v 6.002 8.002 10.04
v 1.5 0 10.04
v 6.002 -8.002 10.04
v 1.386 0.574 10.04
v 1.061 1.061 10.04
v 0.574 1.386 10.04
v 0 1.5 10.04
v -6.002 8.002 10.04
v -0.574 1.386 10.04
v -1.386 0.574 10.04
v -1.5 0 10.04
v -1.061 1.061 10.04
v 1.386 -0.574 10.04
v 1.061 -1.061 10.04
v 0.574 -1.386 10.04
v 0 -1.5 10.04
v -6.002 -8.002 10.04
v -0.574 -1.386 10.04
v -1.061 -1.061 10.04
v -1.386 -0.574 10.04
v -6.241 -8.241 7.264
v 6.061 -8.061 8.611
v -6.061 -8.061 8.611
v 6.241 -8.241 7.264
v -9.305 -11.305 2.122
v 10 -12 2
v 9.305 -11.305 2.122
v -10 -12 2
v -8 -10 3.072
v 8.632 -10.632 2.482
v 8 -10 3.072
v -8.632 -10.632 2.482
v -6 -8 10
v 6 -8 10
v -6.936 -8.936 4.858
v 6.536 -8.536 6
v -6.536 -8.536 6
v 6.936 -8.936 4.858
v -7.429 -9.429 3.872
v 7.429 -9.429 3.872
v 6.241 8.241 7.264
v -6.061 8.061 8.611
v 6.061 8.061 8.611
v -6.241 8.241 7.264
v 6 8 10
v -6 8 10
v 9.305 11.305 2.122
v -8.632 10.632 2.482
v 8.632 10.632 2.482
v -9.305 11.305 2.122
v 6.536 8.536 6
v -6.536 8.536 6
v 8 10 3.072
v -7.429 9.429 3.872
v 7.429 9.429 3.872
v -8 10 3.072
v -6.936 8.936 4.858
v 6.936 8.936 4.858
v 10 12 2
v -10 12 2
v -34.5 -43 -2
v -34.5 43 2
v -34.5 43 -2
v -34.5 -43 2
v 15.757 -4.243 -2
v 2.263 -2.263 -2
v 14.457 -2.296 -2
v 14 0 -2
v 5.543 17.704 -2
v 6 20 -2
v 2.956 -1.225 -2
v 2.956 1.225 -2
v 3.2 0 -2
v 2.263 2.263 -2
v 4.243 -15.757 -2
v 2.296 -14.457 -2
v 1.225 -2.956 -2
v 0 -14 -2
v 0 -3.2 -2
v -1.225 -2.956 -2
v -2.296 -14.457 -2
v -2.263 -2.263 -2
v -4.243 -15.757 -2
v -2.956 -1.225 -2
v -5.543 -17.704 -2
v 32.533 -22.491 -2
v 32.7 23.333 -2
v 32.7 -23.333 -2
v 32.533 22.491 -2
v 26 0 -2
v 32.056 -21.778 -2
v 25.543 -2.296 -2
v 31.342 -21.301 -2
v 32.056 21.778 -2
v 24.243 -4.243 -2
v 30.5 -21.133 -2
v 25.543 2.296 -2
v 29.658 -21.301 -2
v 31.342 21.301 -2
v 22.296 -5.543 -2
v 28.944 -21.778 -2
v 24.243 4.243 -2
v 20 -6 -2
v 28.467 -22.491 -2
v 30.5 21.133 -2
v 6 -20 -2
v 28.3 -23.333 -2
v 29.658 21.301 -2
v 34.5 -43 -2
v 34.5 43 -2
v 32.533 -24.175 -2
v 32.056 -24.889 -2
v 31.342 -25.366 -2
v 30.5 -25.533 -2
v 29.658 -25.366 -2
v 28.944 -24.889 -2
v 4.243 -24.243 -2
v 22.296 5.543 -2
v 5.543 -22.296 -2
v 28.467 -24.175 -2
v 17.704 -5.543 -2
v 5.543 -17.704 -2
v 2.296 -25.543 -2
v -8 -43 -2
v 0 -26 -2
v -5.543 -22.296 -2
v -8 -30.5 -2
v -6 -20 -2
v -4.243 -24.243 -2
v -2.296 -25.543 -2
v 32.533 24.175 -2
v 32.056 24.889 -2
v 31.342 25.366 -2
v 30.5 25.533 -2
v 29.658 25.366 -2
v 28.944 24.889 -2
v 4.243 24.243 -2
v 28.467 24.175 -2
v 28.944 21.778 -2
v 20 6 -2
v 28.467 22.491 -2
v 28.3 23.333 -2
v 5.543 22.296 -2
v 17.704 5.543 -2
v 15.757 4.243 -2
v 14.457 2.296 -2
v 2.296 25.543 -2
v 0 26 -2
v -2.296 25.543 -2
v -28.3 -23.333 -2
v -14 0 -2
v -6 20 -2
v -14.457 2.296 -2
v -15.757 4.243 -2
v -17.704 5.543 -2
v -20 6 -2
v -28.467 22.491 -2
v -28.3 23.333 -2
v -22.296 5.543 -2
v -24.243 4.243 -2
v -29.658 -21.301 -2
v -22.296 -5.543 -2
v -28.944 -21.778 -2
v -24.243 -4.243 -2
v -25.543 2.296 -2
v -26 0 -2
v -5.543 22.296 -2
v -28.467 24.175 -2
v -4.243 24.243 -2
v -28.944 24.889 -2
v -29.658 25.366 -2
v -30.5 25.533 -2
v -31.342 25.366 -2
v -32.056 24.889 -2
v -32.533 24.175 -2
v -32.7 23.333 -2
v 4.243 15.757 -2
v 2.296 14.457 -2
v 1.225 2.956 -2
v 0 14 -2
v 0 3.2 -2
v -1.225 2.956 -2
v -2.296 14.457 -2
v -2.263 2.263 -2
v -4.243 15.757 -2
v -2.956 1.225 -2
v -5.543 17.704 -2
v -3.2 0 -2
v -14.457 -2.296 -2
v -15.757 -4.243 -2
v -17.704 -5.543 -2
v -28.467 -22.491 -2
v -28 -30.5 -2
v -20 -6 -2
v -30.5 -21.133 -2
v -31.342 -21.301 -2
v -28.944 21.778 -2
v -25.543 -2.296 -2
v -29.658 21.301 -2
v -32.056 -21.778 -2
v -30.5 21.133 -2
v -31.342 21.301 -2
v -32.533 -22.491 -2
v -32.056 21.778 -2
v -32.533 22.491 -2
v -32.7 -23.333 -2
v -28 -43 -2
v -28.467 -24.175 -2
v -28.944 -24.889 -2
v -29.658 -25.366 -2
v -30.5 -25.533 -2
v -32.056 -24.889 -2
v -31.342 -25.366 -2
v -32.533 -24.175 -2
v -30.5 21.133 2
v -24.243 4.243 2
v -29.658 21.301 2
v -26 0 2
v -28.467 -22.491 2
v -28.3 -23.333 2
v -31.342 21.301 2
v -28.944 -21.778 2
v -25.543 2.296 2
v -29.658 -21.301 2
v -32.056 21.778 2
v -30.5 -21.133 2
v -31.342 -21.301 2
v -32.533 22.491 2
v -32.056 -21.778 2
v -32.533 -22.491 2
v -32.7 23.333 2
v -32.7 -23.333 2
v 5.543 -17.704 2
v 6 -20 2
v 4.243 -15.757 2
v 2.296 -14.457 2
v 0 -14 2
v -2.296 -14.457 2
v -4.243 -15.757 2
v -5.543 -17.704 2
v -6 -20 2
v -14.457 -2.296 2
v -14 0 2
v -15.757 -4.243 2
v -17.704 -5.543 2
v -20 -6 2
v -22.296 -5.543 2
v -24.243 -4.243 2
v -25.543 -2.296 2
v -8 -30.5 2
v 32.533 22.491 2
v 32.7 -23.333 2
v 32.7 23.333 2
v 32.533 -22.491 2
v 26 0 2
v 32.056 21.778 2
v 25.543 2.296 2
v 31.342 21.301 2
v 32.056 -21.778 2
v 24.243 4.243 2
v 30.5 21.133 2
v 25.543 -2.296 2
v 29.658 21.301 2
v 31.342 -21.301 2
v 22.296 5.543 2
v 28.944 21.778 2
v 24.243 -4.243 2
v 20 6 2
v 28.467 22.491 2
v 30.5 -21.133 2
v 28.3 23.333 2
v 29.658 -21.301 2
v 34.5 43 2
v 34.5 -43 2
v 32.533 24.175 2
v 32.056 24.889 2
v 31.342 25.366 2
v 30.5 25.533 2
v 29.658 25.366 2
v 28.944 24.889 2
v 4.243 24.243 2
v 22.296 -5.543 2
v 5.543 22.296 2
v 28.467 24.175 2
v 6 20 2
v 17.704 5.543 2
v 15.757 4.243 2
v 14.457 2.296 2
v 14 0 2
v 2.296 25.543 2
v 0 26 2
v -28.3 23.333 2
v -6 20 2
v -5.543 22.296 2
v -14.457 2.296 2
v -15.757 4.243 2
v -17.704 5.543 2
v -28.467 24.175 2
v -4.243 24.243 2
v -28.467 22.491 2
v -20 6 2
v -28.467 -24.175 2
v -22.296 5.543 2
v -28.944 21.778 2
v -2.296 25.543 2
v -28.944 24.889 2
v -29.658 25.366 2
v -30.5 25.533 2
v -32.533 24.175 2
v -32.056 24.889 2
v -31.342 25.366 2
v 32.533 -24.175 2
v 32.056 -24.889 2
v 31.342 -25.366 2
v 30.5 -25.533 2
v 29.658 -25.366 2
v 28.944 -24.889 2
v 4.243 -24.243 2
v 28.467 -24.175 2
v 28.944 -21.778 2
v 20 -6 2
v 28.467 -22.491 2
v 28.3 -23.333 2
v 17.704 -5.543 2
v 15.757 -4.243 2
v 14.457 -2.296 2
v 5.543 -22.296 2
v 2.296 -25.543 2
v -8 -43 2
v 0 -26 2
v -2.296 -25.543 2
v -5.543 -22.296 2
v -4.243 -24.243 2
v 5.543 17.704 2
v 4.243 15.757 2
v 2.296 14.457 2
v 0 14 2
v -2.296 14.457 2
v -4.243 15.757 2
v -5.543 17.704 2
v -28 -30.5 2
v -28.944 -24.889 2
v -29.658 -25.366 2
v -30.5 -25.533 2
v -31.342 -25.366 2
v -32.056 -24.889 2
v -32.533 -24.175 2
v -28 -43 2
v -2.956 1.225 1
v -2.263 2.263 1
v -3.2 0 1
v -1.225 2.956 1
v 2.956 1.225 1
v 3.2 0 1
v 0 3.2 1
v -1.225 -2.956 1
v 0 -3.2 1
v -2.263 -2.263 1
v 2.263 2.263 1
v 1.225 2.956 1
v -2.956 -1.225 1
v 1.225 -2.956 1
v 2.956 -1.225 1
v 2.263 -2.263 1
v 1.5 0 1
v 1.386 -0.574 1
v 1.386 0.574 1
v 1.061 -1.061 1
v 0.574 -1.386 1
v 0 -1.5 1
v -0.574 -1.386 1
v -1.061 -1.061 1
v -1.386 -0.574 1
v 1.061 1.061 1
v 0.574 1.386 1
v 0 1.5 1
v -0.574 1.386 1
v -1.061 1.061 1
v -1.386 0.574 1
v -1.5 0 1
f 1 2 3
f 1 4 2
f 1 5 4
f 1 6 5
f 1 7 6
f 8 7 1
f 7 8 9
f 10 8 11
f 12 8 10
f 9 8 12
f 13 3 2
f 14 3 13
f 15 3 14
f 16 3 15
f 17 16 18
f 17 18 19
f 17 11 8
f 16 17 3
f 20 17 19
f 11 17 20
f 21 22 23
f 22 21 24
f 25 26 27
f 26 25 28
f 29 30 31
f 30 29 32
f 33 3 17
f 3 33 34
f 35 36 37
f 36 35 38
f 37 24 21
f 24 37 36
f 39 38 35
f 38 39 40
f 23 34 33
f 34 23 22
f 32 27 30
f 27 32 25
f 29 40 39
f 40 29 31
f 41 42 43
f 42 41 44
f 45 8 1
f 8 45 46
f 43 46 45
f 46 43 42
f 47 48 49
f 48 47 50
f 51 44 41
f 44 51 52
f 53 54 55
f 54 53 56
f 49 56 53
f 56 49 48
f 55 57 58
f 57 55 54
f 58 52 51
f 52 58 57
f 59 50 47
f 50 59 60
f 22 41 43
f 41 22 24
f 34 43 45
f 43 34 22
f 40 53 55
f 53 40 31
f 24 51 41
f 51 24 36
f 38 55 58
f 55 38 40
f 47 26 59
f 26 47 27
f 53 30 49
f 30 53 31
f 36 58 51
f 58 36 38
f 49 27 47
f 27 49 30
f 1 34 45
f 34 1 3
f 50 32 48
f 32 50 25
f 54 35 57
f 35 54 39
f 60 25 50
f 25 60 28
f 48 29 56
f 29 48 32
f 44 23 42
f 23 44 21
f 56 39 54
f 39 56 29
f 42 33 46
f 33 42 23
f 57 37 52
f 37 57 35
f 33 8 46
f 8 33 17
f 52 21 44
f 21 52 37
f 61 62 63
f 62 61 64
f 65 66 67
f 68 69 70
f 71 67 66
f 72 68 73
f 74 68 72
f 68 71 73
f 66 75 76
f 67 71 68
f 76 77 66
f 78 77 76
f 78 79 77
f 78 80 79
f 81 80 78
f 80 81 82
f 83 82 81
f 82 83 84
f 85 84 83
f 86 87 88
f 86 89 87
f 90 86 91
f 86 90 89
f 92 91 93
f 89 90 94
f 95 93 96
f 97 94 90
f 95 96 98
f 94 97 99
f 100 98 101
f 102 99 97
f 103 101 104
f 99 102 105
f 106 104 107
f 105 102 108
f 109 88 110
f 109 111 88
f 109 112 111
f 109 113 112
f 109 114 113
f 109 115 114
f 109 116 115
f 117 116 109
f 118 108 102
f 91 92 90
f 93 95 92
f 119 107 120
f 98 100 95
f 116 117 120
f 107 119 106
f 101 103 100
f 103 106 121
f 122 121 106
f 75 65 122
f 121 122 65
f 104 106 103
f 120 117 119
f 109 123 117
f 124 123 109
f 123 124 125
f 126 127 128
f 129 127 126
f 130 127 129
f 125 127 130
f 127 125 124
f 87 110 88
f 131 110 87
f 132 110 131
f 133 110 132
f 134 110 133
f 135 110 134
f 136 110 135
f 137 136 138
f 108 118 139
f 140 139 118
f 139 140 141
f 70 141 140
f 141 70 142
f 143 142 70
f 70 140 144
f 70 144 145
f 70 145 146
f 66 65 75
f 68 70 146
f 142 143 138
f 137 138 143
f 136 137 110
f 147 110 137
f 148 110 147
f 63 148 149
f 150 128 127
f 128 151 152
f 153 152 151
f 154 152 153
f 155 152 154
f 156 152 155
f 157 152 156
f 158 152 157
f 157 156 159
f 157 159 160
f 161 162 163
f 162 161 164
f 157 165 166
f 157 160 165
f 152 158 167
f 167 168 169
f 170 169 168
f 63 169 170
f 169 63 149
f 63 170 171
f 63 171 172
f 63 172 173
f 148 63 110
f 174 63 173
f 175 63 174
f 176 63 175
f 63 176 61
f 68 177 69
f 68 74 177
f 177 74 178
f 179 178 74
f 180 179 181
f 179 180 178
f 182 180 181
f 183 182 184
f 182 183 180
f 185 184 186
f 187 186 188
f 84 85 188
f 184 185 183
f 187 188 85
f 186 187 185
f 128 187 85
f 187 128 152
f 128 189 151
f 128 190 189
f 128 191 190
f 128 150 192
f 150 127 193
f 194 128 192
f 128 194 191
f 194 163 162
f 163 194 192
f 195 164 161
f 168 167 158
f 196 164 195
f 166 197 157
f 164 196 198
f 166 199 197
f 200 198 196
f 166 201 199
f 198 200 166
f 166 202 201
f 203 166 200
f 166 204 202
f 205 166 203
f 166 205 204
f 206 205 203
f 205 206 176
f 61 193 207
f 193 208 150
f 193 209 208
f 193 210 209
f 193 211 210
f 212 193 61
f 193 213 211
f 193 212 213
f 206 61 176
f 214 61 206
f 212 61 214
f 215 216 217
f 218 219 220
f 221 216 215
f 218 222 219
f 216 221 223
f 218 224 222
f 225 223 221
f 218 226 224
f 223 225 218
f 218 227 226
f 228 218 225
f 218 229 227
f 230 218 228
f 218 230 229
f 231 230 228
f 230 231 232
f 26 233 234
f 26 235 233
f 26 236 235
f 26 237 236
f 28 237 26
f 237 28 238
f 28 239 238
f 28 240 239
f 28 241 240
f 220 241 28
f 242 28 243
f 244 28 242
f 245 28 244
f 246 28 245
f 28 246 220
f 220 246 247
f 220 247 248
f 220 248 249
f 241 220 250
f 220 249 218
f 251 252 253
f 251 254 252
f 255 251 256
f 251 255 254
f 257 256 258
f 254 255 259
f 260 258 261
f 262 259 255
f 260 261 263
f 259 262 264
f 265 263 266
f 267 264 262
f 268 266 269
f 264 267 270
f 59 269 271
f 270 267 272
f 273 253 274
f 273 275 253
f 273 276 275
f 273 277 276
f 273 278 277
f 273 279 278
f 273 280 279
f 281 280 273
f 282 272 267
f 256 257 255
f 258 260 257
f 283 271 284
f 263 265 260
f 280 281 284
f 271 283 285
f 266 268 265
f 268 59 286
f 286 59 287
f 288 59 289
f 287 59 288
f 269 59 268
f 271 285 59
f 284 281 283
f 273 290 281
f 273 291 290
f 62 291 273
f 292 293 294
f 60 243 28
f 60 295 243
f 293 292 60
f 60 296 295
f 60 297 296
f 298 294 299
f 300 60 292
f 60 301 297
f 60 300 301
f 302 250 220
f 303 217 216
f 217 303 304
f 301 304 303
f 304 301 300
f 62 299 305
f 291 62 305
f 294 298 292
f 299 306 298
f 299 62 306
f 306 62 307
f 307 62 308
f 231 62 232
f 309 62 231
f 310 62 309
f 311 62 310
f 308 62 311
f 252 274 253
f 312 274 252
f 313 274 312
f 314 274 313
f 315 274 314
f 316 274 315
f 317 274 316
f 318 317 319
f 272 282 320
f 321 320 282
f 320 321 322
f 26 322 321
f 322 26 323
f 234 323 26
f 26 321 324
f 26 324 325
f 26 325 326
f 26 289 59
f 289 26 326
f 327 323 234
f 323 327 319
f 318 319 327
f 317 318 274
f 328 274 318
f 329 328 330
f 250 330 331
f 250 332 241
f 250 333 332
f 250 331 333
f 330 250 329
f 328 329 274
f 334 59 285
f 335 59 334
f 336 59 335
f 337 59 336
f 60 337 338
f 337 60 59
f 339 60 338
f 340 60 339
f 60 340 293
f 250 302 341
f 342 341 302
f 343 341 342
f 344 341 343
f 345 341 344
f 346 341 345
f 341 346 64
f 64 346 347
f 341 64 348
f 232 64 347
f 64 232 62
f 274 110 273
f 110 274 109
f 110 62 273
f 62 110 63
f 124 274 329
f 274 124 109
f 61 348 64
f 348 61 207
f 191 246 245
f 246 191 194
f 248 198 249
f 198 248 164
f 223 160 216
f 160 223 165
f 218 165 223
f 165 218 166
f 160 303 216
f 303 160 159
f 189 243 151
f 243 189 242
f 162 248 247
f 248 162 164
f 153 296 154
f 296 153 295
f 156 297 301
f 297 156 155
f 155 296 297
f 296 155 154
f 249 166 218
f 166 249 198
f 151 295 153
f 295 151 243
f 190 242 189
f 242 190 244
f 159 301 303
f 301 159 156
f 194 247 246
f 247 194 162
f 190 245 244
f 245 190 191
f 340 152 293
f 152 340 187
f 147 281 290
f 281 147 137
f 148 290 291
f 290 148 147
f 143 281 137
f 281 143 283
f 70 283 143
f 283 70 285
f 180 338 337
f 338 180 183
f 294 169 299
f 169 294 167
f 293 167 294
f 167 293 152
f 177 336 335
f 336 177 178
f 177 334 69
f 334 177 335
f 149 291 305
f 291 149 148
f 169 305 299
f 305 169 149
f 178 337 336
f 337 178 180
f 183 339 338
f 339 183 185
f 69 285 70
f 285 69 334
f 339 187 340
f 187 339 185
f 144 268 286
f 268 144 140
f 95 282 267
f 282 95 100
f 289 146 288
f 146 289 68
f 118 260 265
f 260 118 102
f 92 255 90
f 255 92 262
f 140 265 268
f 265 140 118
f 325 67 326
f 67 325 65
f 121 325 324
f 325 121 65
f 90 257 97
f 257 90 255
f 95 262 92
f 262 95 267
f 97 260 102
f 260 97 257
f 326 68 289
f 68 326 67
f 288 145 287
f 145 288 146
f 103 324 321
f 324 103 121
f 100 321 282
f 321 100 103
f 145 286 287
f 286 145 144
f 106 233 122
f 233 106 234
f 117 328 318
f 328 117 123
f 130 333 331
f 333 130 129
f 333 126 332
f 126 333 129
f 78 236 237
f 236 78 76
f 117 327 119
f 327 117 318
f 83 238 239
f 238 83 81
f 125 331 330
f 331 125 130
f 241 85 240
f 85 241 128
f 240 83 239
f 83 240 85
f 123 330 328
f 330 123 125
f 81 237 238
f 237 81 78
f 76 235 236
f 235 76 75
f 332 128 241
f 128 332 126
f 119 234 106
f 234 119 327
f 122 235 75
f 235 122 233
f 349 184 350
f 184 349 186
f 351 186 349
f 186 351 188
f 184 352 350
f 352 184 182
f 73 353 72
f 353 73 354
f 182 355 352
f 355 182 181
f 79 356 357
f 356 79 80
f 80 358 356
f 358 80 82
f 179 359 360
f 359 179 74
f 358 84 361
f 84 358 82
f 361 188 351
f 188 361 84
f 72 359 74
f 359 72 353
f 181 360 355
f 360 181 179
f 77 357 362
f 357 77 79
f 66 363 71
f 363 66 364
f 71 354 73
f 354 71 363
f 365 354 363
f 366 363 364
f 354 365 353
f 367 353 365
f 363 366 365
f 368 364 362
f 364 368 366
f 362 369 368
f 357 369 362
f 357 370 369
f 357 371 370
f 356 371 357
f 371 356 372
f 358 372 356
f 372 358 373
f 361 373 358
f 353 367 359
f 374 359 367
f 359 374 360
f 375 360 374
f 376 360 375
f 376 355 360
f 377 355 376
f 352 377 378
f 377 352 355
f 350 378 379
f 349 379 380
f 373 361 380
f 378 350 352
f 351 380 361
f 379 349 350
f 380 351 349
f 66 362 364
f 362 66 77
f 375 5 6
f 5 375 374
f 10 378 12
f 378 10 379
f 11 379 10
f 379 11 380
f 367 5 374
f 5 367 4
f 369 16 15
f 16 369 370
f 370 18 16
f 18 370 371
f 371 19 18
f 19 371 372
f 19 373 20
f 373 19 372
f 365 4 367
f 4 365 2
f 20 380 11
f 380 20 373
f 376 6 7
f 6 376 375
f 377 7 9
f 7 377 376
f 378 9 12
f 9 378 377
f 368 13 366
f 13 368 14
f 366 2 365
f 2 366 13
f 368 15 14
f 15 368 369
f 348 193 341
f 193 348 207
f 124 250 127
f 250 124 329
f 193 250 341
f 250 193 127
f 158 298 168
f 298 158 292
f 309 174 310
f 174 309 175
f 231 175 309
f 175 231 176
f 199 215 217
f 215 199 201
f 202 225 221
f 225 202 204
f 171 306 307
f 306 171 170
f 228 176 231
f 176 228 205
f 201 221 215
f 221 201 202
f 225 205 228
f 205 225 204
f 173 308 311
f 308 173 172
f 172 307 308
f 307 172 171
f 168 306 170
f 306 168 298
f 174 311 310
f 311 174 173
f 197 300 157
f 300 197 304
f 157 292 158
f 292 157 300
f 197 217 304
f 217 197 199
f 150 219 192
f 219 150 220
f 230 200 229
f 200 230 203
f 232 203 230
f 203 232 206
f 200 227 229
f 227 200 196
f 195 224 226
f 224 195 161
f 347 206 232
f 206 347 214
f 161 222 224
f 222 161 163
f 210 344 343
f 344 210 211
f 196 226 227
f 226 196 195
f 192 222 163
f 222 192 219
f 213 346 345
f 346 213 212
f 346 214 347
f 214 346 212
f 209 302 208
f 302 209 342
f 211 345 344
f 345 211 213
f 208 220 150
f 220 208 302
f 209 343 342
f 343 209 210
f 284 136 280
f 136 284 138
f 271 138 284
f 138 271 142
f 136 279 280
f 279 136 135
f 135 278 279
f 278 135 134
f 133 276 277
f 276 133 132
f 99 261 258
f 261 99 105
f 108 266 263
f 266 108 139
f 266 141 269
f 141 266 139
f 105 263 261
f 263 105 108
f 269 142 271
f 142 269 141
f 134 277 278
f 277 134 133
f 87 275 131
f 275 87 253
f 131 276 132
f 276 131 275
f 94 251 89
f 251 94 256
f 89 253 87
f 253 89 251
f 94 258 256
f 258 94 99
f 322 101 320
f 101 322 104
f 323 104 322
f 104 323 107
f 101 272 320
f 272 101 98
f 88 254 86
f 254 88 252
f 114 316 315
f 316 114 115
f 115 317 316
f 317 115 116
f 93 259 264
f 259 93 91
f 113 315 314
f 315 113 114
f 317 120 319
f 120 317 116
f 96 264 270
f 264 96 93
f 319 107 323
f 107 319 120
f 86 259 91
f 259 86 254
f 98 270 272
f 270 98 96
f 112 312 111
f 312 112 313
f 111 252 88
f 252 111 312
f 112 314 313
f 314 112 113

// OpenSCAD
//include <iPod_nano_4gen_bike_mount.scad>

$fn=16;
//production=false;

ipod_n4_height=70;        // top to bottom when looking at the display
ipod_n4_width=53;        // left ro right when looking at the display
ipod_n4_edge_radius=5.3; // radius of circle describing the edge's radius

module round_edges_box(boundingbox=[1,1,1], r=0.1, only_bottom=false, center=false) {
    if( center == false ) {
        translate([boundingbox[0]/2, boundingbox[1]/2, boundingbox[2]/2]) round_edges_box_hull(boundingbox=boundingbox, r=r, only_bottom=only_bottom);
    } else {
        round_edges_box_hull(boundingbox=boundingbox, r=r, only_bottom=only_bottom);
    }
}

module round_edges_box_hull(boundingbox=[1,1,1], r=0.1, only_bottom=false) {
    x=boundingbox[0]/2;
    y=boundingbox[1]/2;
    z=boundingbox[2]/2;
    hull() {
        for(x1=[-x+r,x-r]) {
            for(y1=[-y+r,y-r]) {
                for(z1=[-z+r,z-r]) {
                    if( only_bottom == true && z1>0) {
                        translate([x1,y1,z1]) cylinder(r=r, h=r*2, center=true);
                    } else {
                        translate([x1,y1,z1]) sphere(r=r, center=true);
                    }
                }
            }
        }
    }
}

/**
iPod-Stuff starts here
*/
module ipodStandBottom(ipx=ipod_n4_width, ipy=ipod_n4_height, width=4, border=8) {
    cx=20;
    cy=24;
    cz=8;
    rotate([0,180,0]) difference() {
        union() {
            //round_edges_box([2*border+ipx, 2*border+ipy, width], r=2, center=true);
            cube([2*border+ipx, 2*border+ipy, width], center=true);
            difference() {
                translate([0,0,-cz/2-width/2]) cube([cx,cy,cz*1.01], center=true);
                translate([0,-cy/2,-cz-width/2]) rotate([0,90,0]) scale([1,0.5,1]) cylinder(r=cz, h=1.1*cx, center=true, $fn=36);
                translate([0,cy/2,-cz-width/2]) rotate([0,90,0]) scale([1,0.5,1]) cylinder(r=cz, h=1.1*cx, center=true, $fn=36);
                translate([-cx/2,0,-cz-width/2]) rotate([90,0,0]) scale([0.5,1,1]) cylinder(r=cz, h=1.1*cy, center=true, $fn=36);
                translate([cx/2,0,-cz-width/2]) rotate([90,0,0]) scale([0.5,1,1]) cylinder(r=cz, h=1.1*cy, center=true, $fn=36);
            }
        }
        // hole for central screw
        translate([0,0,width/2-3]) cylinder(r=3.2, h=2*width, center=false);
        cylinder(r=1.5, h=62, center=true);
        // hole for earplug
        //translate([18,-ipy/2+0.5,0]) rotate([90,0,0]) cylinder(r1=9,r2=9,h=border+1, center=false);
        translate([18,(-ipy-border+width)/2,0]) cube([20,border+width+1,50], center=true);
        // holes to reduce material usage
        for( rot = [0:90:359] ) {
            rotate([0,0,rot]) translate([20,0,0]) cylinder(r=6, h=2*width, center=true);
        }
        // klebelöcher
        translate([(ipx+border)/2,ipy/3,0])   cylinder(r=2.2, h=2*width, center=true);
        translate([(ipx+border)/2,-ipy/3,0])  cylinder(r=2.2, h=2*width, center=true);
        translate([-(ipx+border)/2,ipy/3,0])  cylinder(r=2.2, h=2*width, center=true);
        translate([-(ipx+border)/2,-ipy/3,0]) cylinder(r=2.2, h=2*width, center=true);
    }
}

ipodStandBottom();
